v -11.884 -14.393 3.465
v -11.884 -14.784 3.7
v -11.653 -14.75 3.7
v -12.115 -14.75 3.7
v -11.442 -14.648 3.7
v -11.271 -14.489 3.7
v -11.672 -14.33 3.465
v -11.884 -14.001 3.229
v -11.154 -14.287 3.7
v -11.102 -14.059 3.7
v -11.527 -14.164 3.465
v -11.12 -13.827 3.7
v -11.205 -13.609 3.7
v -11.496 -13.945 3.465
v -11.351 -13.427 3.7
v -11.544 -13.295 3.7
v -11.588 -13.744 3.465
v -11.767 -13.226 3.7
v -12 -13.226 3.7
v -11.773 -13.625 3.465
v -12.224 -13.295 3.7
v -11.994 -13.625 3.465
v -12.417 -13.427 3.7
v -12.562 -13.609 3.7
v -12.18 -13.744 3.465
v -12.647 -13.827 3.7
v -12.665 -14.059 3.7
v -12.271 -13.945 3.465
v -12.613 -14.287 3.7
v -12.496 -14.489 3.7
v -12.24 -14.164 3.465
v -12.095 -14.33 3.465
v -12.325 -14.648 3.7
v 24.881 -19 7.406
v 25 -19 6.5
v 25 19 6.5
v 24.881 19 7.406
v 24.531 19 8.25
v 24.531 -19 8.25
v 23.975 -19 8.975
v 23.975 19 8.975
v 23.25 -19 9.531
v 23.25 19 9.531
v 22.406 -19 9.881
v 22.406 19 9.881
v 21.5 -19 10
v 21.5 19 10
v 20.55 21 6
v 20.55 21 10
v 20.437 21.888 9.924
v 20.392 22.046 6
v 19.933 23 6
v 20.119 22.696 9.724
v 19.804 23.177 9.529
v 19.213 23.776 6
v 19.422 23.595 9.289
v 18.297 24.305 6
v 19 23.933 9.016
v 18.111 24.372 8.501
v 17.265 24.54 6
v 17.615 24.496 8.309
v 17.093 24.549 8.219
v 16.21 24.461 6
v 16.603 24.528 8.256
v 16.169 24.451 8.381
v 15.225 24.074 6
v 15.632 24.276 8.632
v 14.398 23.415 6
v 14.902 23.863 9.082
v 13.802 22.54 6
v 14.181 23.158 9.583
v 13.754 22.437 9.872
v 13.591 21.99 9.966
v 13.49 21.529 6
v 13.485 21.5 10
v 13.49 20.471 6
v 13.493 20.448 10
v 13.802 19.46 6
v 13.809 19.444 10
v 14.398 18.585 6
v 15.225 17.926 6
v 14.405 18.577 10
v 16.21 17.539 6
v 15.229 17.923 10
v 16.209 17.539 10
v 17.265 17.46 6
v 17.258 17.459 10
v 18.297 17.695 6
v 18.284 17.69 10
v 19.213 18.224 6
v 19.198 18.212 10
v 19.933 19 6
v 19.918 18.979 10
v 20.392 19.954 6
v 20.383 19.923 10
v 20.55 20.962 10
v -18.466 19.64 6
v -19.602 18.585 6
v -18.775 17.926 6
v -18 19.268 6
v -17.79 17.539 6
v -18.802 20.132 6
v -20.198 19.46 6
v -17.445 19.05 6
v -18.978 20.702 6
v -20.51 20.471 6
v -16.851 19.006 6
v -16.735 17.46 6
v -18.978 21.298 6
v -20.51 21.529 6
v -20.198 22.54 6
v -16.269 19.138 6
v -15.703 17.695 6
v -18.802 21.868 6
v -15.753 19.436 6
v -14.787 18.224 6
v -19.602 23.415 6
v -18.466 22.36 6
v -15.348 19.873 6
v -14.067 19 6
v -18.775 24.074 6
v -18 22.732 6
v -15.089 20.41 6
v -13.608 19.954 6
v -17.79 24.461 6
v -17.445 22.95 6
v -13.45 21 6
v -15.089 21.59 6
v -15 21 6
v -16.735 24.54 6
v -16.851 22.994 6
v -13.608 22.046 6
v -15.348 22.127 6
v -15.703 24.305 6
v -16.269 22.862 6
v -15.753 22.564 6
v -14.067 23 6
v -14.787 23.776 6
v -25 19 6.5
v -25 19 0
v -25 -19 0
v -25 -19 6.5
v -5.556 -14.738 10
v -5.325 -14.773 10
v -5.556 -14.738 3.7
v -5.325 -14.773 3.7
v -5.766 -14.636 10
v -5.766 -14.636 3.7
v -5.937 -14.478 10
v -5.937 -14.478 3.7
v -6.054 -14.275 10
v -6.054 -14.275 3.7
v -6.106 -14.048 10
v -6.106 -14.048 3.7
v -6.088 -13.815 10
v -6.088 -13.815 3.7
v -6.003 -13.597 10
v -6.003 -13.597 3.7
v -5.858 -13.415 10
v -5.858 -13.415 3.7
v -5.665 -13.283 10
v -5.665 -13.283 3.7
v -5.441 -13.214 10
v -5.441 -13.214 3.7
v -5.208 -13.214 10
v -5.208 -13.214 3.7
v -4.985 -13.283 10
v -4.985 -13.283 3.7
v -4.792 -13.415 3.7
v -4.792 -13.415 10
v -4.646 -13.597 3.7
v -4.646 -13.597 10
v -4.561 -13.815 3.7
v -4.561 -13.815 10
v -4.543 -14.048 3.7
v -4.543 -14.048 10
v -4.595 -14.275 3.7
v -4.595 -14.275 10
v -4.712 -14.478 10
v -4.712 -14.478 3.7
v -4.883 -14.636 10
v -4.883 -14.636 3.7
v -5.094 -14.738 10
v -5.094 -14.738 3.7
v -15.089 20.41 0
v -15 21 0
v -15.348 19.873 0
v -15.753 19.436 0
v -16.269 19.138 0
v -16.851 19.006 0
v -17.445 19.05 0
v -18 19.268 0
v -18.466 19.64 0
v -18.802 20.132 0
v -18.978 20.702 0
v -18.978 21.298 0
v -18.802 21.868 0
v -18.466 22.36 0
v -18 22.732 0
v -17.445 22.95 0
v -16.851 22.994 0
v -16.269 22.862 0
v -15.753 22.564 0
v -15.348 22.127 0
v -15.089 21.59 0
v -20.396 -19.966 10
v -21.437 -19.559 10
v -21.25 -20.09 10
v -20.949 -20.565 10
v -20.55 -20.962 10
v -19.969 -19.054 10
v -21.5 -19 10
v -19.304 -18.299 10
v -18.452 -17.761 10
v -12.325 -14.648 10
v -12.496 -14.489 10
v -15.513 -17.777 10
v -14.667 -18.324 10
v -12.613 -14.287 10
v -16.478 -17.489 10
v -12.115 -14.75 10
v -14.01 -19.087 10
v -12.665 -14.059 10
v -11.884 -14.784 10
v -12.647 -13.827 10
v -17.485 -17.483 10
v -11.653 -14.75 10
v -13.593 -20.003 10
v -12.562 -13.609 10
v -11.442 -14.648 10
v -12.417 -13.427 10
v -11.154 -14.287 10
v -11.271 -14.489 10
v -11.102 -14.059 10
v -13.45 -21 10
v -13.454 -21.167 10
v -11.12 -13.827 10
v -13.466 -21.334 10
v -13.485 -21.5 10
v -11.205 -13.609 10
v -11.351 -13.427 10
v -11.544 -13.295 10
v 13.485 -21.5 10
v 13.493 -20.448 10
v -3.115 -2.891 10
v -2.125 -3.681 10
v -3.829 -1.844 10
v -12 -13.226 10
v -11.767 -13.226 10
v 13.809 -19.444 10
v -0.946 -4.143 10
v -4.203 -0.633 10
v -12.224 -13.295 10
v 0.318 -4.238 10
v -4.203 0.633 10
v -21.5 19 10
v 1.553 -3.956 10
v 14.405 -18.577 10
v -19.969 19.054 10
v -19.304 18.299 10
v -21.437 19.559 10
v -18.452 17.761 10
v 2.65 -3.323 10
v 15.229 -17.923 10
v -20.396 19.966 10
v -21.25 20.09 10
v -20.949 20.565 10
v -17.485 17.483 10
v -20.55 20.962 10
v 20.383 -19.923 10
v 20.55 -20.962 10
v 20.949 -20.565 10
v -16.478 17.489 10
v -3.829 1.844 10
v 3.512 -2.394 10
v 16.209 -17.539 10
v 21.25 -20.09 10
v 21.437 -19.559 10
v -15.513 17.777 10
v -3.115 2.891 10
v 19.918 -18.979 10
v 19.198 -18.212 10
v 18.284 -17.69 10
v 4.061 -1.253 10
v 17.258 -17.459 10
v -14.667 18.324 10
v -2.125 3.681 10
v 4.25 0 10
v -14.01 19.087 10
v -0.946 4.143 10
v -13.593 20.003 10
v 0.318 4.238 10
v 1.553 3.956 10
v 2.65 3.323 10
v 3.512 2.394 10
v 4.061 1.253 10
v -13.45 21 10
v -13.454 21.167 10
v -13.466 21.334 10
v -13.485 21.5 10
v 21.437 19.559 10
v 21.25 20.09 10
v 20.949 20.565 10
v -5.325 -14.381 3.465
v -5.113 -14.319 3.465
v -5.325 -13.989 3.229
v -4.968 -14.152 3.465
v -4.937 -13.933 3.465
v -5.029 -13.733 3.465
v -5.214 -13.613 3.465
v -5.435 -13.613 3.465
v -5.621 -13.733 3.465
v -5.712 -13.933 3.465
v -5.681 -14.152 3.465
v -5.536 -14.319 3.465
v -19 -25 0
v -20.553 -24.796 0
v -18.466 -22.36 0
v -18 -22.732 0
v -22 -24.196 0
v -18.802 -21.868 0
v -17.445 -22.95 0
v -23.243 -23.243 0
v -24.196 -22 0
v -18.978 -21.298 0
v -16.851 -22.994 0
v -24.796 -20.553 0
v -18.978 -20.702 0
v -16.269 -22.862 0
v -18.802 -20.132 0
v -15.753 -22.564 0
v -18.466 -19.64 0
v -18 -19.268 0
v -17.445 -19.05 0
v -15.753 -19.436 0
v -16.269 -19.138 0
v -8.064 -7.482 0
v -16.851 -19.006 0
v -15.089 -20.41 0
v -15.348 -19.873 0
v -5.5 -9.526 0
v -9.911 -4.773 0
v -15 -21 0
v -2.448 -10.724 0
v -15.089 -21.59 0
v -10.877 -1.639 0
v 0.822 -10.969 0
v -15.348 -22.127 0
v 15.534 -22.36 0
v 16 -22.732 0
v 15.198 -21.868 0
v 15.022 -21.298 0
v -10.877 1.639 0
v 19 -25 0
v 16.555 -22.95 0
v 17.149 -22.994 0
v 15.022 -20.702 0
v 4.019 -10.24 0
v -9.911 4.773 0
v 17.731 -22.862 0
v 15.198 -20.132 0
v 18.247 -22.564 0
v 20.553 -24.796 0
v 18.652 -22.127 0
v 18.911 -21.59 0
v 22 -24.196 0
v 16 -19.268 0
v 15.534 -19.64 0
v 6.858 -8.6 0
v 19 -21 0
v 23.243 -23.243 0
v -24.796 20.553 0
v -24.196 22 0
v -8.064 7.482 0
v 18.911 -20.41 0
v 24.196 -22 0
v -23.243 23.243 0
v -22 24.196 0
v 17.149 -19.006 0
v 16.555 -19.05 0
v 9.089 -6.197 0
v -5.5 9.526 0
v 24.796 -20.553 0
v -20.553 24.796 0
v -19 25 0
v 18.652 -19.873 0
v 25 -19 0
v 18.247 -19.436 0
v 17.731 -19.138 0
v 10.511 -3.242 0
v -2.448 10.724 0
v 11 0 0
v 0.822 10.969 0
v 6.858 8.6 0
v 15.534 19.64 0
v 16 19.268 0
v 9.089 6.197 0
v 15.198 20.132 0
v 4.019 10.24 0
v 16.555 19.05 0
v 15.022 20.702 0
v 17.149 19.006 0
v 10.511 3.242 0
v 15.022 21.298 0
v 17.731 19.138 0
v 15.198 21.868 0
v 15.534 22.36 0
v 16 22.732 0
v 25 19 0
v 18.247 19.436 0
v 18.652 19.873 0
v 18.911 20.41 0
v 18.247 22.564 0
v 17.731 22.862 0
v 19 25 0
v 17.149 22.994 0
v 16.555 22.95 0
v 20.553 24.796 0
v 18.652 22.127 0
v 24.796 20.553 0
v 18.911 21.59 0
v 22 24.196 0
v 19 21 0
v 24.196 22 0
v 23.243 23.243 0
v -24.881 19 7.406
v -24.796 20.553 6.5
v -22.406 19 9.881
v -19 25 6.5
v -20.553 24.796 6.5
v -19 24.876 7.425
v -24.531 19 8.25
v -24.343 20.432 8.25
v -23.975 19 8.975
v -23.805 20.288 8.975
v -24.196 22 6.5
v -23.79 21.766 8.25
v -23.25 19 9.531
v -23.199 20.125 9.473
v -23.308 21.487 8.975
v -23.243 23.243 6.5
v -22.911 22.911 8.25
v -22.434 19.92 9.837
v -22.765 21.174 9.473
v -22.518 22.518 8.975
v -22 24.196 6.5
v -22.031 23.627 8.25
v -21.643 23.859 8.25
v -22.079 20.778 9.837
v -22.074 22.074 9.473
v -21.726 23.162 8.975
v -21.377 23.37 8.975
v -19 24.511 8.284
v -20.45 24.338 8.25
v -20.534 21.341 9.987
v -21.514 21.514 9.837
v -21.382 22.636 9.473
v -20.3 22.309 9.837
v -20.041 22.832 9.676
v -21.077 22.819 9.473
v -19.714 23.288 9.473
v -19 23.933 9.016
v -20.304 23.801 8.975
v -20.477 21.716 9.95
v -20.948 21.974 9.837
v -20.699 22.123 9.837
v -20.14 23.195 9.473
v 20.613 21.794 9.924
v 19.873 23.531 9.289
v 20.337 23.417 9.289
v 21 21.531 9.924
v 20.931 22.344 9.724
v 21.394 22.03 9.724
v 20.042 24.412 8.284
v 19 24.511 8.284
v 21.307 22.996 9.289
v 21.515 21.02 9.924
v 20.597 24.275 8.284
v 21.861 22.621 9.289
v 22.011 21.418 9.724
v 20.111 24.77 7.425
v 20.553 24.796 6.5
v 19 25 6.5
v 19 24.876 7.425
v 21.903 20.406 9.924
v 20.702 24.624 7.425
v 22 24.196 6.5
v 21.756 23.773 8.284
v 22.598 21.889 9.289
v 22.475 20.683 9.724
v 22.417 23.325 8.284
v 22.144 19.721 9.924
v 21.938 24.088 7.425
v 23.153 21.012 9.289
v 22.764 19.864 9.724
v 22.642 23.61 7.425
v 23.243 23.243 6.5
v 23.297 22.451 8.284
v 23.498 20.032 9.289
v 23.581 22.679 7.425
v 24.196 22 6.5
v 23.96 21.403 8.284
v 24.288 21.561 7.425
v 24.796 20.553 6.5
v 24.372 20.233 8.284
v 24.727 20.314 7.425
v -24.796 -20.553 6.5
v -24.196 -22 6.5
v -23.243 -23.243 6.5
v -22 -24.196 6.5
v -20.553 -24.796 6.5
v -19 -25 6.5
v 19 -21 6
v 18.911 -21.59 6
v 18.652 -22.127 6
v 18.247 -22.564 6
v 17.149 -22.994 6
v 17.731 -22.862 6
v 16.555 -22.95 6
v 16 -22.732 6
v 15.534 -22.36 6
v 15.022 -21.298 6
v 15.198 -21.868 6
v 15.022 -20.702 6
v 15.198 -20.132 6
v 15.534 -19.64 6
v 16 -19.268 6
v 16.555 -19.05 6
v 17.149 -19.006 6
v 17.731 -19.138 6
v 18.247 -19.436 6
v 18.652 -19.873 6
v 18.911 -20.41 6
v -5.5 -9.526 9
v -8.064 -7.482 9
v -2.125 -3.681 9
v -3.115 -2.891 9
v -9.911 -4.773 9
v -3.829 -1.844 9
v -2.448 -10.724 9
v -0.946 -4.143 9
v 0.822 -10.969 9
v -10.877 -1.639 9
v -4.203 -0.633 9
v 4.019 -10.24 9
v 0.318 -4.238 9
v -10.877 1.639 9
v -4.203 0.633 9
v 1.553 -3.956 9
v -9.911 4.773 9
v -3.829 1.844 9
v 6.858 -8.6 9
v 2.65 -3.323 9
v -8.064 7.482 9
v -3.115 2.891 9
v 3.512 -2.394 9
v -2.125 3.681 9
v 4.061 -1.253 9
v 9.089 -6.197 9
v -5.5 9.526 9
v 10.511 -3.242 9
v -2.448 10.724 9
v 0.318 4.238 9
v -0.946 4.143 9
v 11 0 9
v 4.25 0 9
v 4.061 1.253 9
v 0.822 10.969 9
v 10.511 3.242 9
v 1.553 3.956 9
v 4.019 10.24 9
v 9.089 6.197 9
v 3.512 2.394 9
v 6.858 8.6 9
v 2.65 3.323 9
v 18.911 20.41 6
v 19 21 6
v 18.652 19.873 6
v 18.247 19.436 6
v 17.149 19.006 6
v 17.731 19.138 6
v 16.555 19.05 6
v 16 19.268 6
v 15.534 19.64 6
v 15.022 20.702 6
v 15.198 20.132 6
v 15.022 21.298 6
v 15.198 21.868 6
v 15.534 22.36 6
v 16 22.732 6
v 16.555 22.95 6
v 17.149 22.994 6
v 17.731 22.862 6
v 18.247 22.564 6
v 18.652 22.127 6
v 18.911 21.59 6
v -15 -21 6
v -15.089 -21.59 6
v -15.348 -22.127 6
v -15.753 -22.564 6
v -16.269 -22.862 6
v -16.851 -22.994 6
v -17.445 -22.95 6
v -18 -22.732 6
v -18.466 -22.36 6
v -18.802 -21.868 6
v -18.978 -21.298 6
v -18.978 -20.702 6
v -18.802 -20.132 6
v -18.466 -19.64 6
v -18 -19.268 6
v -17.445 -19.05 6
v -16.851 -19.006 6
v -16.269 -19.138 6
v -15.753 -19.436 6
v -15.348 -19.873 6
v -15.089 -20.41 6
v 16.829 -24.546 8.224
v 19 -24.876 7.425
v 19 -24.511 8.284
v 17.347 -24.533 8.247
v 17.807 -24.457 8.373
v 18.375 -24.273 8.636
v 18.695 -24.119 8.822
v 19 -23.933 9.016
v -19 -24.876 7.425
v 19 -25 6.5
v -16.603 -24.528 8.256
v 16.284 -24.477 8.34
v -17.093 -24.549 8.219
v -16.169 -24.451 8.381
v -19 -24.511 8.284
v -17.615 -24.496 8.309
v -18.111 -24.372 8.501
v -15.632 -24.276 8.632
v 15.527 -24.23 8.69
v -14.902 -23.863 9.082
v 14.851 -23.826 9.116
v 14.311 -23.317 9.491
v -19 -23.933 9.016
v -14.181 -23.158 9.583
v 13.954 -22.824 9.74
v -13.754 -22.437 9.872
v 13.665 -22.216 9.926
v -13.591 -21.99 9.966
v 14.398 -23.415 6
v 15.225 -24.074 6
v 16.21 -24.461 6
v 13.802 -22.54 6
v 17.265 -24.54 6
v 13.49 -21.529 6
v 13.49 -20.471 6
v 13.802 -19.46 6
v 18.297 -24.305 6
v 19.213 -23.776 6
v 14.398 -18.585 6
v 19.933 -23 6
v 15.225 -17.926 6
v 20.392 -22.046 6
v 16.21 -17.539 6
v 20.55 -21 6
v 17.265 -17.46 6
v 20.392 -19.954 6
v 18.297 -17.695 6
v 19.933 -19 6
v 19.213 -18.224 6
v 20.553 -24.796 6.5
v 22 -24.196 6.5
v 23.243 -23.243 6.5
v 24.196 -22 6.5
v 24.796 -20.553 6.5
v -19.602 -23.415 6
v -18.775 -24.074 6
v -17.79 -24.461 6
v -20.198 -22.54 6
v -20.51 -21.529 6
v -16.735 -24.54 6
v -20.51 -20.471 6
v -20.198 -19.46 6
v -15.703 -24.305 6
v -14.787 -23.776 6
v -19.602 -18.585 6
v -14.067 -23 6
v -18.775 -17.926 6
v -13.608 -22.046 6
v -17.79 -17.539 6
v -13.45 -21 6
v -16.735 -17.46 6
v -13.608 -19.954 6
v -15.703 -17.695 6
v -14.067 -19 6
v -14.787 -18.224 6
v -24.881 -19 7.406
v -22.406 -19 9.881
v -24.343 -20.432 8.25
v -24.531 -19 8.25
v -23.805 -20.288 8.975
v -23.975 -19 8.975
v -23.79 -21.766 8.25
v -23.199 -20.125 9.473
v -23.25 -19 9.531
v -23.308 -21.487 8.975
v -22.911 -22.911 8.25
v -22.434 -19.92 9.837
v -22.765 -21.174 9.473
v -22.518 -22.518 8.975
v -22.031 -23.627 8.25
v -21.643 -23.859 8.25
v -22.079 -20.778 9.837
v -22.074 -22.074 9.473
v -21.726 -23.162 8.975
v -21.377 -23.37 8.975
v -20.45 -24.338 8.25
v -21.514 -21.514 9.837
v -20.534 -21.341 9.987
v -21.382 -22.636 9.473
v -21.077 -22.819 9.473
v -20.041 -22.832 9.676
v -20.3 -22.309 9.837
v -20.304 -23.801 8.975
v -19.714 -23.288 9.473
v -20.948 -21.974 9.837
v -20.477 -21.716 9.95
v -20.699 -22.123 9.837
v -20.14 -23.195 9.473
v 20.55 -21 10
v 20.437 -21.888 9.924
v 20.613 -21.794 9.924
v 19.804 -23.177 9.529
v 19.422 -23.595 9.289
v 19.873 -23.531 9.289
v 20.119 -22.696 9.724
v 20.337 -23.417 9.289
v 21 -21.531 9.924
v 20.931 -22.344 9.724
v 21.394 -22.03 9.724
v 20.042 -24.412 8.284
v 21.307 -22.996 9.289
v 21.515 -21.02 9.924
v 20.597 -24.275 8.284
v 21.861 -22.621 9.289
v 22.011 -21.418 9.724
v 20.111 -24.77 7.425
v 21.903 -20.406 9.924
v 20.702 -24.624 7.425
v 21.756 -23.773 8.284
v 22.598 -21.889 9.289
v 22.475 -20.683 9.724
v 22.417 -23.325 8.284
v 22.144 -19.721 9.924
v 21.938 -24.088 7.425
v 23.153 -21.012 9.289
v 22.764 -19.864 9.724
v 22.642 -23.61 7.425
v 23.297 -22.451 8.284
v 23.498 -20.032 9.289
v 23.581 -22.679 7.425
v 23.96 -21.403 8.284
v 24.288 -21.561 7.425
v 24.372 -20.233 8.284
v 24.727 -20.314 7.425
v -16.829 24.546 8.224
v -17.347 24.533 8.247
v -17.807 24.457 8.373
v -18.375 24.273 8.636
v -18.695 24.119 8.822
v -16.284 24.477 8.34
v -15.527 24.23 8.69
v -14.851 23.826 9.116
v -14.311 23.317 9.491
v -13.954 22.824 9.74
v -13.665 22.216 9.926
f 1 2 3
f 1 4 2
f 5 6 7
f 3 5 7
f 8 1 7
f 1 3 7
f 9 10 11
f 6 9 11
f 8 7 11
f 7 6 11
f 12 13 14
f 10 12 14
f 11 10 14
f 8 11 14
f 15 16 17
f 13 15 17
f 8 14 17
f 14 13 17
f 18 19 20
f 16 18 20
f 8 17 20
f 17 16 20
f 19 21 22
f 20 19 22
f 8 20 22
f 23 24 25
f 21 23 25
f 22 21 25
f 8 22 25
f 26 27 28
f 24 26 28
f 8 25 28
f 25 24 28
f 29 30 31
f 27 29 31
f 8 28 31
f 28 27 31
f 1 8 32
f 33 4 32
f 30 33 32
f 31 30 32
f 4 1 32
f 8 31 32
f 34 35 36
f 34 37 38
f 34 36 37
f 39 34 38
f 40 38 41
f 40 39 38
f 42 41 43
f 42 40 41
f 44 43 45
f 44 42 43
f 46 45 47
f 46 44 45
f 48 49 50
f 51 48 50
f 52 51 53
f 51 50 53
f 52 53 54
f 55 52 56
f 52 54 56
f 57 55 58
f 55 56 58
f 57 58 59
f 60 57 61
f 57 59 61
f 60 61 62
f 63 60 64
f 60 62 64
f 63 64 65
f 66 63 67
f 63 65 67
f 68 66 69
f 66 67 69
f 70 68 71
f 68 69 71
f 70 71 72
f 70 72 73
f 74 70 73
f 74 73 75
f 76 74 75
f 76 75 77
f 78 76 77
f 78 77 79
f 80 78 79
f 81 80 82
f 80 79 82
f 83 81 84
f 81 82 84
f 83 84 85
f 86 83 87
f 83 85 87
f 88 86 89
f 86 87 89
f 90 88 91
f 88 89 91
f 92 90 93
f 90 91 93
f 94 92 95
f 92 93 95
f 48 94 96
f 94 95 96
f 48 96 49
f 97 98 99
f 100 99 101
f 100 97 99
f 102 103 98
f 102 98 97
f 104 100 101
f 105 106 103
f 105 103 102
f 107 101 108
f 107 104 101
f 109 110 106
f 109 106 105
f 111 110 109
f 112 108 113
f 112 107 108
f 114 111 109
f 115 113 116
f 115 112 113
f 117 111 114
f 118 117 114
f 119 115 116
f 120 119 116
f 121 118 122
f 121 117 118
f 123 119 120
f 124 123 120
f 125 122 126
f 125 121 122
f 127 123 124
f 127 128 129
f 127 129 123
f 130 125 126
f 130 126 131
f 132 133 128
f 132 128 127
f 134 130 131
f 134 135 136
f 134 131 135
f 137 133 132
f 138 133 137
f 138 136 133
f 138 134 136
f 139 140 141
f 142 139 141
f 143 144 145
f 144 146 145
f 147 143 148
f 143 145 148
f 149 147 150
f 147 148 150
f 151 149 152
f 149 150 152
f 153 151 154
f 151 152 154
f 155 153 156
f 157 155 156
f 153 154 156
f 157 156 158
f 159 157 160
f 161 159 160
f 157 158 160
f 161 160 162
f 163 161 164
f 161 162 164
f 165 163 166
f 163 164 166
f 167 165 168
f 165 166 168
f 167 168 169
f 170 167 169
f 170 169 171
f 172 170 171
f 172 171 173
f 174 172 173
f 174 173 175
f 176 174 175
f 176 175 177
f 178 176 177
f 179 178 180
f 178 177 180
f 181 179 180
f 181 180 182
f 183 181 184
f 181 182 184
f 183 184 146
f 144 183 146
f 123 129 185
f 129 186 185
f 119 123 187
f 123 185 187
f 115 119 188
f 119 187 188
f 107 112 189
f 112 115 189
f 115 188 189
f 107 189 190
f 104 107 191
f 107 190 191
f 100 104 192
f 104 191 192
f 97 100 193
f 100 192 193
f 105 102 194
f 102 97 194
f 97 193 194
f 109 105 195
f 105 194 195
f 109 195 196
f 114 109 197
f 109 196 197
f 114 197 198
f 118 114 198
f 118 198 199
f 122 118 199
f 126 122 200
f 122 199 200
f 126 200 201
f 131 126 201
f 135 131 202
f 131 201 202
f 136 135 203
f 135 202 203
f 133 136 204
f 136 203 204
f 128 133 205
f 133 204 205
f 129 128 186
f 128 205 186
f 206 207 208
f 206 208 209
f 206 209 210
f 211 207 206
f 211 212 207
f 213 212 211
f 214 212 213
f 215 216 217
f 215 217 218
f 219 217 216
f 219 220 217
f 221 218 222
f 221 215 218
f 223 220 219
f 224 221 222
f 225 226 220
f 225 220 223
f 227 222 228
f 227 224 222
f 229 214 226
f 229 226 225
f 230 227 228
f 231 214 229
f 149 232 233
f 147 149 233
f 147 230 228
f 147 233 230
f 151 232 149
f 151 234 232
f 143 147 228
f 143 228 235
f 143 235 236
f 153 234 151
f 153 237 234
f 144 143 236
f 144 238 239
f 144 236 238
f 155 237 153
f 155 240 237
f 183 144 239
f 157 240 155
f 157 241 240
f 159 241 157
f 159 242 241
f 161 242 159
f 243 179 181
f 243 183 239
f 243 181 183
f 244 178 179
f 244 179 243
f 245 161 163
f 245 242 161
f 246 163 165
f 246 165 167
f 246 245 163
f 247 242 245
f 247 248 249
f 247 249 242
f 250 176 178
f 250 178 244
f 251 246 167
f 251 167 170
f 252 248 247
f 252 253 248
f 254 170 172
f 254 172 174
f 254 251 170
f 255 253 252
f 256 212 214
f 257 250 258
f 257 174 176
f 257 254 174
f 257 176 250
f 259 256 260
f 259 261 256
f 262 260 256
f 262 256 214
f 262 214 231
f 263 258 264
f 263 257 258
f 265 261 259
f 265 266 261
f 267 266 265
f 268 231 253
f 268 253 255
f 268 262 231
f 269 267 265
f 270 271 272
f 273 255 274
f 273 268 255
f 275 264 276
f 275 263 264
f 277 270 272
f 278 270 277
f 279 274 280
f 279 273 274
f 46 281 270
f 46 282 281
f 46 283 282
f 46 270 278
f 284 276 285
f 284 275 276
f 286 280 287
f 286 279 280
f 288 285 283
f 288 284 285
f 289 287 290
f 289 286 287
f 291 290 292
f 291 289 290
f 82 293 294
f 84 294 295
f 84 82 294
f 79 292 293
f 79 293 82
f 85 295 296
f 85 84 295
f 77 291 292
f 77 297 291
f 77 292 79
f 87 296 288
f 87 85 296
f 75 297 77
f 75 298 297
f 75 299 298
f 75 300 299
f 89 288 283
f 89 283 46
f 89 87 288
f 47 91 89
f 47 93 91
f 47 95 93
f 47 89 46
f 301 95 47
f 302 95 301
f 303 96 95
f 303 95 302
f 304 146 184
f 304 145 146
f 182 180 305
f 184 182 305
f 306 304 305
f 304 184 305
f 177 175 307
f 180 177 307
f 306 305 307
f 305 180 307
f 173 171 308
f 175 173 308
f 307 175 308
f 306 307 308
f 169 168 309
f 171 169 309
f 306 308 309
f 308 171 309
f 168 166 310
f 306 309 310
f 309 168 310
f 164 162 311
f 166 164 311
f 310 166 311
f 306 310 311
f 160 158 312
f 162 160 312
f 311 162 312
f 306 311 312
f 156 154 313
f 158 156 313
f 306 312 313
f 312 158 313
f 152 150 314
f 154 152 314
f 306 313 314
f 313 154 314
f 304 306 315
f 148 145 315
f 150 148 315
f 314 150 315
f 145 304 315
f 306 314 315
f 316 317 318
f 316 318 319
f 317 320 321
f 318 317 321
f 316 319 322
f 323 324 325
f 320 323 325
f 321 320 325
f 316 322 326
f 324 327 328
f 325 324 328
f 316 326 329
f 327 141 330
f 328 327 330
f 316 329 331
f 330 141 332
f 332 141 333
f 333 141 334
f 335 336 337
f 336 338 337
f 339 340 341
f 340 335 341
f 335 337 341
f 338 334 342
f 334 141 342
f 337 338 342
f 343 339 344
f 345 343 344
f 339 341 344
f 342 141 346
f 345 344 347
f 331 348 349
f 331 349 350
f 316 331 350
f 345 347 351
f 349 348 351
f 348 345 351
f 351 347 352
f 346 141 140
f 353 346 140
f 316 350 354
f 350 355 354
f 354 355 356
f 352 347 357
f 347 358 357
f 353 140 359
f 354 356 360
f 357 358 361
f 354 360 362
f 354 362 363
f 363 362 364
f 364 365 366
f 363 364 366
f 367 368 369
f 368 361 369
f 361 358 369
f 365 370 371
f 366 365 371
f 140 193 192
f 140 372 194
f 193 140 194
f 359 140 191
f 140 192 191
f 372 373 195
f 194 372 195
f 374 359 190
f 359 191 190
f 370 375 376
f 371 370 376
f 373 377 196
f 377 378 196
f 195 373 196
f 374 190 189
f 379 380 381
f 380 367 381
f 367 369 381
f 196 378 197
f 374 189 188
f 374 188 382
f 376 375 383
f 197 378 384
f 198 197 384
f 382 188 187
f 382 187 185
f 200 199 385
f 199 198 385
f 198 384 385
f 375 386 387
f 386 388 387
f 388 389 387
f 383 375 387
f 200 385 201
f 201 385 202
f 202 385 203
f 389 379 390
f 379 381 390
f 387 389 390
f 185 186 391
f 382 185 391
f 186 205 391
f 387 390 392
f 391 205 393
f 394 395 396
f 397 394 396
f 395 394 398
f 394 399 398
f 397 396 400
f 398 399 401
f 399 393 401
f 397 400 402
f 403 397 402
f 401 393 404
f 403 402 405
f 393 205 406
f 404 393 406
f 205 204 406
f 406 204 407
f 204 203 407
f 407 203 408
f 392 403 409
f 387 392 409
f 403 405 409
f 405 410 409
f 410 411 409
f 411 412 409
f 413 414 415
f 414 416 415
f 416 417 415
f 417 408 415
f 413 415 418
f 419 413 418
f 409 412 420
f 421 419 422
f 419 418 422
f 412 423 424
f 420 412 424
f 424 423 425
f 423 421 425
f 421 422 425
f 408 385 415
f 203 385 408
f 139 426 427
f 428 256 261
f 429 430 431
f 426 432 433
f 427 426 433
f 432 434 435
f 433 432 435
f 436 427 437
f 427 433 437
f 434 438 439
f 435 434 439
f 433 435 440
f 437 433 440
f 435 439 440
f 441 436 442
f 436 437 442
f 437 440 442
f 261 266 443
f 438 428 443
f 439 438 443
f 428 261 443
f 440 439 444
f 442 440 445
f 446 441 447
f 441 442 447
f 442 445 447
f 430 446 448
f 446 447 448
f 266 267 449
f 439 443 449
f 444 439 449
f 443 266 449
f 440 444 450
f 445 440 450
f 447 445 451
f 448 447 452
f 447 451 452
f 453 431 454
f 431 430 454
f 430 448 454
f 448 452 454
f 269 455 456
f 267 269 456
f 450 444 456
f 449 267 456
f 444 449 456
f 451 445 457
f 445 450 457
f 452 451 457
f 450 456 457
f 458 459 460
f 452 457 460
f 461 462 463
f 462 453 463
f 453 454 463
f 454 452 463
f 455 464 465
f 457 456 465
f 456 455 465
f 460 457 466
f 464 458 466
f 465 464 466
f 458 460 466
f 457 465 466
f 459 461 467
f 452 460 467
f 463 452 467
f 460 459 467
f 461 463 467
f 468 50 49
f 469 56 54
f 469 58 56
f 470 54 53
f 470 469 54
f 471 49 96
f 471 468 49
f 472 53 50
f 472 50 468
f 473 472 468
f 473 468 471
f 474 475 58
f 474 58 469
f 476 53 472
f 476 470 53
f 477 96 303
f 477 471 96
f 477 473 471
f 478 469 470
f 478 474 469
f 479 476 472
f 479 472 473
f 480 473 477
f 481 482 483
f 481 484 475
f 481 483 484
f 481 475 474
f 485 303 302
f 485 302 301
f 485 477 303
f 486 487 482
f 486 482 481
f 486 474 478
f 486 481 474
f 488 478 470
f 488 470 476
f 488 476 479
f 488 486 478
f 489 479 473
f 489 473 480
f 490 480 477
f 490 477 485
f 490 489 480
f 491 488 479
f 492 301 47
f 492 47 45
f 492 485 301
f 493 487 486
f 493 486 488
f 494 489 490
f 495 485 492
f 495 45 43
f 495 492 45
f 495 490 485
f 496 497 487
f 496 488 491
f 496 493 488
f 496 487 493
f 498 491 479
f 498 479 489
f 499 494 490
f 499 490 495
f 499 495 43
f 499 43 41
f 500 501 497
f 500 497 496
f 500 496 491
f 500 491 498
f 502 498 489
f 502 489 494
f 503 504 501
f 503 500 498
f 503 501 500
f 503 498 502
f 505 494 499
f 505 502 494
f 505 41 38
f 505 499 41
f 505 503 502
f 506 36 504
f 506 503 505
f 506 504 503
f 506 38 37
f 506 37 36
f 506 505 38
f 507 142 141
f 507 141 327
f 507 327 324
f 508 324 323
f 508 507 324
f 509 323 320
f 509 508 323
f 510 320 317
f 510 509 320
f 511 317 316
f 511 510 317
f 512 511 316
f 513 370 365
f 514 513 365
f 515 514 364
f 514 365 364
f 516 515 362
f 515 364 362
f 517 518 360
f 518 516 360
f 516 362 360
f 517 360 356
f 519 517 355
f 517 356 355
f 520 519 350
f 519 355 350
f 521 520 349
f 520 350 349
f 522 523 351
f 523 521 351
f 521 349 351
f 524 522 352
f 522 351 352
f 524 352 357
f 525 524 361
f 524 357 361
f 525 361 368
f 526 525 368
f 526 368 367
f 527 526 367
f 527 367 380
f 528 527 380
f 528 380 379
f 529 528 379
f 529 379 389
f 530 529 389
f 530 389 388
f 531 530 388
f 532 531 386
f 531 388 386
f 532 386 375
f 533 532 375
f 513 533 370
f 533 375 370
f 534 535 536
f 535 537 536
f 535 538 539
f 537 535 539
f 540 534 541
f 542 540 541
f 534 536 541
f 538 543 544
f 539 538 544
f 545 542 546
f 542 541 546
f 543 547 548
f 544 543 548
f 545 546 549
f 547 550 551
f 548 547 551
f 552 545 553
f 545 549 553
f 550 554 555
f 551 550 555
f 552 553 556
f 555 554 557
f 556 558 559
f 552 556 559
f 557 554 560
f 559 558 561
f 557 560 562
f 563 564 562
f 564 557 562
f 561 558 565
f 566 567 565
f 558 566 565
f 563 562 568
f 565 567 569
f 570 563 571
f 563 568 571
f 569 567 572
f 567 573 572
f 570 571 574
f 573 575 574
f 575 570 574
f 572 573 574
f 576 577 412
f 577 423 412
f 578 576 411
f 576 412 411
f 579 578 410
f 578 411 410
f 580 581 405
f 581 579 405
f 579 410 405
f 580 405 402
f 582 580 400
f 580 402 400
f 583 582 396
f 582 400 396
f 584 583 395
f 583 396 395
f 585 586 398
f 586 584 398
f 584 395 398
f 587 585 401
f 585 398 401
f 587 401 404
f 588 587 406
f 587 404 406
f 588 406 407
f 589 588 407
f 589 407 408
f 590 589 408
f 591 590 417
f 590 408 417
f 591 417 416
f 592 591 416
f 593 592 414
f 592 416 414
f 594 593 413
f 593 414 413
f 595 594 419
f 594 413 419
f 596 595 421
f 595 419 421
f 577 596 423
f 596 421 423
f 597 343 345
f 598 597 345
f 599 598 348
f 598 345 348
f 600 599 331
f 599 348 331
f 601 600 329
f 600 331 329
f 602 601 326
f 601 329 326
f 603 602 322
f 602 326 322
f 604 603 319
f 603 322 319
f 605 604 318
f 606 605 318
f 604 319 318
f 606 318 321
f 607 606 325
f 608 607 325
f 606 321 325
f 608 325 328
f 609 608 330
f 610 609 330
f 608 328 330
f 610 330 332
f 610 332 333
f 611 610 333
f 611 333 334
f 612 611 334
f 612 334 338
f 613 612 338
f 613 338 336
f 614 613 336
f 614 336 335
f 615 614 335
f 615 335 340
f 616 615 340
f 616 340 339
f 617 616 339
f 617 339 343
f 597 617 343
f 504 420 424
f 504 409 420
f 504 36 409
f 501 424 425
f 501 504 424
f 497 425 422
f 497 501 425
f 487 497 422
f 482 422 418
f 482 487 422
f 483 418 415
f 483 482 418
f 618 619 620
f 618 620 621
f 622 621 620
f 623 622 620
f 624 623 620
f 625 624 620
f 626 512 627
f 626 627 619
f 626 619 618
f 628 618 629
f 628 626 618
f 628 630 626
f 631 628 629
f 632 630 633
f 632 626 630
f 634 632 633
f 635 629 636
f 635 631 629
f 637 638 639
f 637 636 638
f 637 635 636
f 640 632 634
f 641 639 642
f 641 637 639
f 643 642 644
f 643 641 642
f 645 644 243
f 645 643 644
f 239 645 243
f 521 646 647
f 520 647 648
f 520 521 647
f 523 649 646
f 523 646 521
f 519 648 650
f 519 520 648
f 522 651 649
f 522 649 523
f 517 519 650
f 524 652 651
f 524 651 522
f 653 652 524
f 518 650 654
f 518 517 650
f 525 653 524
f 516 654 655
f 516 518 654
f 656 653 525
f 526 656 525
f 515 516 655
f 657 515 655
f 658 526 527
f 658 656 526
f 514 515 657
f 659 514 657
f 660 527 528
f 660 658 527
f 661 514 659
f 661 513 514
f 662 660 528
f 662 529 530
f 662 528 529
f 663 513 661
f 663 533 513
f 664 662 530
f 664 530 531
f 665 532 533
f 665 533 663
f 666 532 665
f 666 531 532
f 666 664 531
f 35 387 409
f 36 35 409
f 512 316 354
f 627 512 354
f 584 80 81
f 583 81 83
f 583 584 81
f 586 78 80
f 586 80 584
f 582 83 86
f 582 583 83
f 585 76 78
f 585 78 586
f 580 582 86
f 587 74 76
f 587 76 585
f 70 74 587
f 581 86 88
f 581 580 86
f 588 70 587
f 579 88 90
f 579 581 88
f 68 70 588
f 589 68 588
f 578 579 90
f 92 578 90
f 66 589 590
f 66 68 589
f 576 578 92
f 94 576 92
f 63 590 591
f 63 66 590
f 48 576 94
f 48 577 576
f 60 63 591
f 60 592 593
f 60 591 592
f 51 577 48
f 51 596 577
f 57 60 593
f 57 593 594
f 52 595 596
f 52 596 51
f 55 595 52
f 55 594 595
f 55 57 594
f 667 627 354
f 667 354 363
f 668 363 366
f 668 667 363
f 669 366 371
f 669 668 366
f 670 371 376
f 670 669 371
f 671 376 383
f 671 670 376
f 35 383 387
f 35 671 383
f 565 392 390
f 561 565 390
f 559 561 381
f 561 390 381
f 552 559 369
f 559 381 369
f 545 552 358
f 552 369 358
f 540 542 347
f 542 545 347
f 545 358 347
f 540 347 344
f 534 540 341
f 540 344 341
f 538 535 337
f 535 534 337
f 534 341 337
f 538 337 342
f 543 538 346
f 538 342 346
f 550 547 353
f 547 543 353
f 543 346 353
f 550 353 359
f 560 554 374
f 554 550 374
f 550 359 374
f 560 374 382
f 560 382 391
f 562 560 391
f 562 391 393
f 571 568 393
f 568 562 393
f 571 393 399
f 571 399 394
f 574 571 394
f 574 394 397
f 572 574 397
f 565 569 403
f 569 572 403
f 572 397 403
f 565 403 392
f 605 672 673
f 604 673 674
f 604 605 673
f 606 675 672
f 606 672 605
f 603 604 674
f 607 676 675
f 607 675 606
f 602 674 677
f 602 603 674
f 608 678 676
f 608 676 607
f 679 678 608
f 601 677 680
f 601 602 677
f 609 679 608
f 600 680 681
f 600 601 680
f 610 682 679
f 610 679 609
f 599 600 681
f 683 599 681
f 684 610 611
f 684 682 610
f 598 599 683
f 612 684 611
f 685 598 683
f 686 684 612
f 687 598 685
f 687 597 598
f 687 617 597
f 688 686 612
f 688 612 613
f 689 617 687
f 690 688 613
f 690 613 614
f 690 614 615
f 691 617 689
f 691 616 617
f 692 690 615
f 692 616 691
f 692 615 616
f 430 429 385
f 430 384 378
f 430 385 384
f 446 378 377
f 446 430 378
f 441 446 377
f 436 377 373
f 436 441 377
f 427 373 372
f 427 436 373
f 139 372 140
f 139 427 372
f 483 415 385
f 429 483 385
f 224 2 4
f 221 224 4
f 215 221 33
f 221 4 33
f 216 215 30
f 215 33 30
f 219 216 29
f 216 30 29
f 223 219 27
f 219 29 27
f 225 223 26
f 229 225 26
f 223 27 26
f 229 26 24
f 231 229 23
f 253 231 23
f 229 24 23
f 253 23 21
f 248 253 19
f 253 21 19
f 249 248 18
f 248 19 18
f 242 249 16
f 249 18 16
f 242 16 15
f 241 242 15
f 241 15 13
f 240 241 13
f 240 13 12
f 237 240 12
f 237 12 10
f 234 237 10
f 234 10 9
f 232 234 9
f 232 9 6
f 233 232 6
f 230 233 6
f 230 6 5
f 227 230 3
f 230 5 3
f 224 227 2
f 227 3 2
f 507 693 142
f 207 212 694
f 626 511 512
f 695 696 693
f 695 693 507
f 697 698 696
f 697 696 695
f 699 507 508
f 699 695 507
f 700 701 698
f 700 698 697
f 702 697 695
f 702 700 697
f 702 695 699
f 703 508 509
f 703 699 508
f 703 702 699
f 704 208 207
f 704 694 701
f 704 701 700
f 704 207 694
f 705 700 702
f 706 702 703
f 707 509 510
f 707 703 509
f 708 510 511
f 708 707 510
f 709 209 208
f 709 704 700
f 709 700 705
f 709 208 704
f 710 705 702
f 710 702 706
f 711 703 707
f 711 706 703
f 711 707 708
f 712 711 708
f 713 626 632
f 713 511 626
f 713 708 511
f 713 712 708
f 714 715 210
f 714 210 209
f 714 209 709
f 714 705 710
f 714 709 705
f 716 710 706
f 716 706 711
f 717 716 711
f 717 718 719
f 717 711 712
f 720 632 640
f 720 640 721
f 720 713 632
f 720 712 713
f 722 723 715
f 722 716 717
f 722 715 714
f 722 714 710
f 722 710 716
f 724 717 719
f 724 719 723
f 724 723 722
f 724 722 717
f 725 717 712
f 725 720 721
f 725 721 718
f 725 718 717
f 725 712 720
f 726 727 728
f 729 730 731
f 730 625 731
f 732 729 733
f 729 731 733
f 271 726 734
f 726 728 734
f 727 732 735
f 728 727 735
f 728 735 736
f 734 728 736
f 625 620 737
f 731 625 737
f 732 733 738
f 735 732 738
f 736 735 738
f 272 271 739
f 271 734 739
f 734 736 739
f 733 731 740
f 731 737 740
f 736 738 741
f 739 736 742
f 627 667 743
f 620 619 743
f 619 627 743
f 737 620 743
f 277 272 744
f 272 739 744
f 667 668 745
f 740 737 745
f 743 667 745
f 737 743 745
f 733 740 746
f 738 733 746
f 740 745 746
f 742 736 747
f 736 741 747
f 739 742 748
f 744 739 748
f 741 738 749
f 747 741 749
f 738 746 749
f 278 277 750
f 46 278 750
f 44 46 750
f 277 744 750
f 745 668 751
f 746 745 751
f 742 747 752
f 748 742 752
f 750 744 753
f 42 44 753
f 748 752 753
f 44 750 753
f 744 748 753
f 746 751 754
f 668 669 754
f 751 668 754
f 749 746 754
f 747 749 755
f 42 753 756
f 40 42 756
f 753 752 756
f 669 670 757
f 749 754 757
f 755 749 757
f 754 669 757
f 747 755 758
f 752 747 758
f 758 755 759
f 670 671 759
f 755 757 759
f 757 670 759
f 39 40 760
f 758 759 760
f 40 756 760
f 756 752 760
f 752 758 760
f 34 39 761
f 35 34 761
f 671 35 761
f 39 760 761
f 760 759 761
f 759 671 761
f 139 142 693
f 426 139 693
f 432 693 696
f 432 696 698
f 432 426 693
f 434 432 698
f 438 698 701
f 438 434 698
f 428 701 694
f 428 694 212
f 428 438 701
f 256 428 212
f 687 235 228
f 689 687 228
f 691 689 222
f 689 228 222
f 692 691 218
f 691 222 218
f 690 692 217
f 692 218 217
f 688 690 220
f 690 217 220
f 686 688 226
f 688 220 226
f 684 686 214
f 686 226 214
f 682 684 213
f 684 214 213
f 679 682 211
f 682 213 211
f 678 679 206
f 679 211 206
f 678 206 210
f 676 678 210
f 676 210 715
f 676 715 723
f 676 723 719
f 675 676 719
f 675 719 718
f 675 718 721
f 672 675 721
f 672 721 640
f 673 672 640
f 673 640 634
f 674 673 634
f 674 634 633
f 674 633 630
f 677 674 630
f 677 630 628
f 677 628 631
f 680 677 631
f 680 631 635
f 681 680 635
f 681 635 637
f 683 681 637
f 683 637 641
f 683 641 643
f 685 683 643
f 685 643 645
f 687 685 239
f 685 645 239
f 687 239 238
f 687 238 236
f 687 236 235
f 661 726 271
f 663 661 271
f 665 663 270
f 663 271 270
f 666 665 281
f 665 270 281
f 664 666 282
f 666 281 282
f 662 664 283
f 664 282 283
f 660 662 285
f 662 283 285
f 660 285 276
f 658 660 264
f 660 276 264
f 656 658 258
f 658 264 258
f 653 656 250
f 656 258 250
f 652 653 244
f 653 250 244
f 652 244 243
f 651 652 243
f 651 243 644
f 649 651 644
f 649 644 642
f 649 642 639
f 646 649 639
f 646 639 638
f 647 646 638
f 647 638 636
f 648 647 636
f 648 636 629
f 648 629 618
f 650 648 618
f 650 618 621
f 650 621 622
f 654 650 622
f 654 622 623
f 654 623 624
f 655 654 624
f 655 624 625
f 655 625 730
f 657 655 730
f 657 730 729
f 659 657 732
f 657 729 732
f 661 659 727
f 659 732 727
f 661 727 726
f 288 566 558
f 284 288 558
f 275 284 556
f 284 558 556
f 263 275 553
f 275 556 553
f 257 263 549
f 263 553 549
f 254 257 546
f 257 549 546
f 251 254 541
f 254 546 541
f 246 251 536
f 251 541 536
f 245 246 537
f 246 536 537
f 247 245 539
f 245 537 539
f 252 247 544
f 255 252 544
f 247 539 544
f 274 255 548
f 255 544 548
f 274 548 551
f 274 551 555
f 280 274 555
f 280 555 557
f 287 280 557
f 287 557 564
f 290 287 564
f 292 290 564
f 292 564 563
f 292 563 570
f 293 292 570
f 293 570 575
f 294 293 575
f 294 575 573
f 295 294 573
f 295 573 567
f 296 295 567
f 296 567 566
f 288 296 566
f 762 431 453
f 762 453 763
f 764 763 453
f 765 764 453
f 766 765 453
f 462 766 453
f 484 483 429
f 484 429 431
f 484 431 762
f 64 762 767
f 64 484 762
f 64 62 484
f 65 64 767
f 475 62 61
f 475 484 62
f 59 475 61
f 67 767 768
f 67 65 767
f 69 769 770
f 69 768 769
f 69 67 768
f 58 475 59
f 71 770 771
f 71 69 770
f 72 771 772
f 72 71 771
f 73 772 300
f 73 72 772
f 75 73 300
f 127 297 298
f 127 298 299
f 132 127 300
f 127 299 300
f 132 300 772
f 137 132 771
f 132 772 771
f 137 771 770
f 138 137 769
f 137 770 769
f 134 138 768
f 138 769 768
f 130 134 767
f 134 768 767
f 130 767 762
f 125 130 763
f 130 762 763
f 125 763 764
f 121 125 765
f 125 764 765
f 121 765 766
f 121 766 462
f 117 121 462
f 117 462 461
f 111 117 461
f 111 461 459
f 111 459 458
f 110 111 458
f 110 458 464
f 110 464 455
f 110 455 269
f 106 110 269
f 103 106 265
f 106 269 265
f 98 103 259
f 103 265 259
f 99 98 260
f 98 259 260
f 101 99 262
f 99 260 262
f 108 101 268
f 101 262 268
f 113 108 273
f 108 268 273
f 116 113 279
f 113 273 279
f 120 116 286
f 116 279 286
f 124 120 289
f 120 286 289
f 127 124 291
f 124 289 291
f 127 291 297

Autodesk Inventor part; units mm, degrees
ref_plane "YZ Plane" through (0, 0, 0) normal (1, 0, 0) x (0, 1, 0)
ref_plane "XZ Plane" through (0, 0, 0) normal (0, 1, 0) x (-1, 0, 0)
ref_plane "XY Plane" through (0, 0, 0) normal (0, 0, 1) x (1, 0, 0)
sketch "Sketch1" plane through (0, 0, 0) normal (0, 0, 1) x (1, 0, 0)
  line L0 (-25, -25) -> (25, -25)
  line L1 (25, -25) -> (25, 25)
  line L2 (25, 25) -> (-25, 25)
  line L3 (-25, 25) -> (-25, -25)
  line L4 (-25, -25) -> (25, 25) construction
  line L5 (25, -25) -> (-25, 25) construction
  line L6 (-15, 15) -> (15, 15)
  line L7 (15, 15) -> (15, -15)
  line L8 (15, -15) -> (-15, -15)
  line L9 (-15, -15) -> (-15, 15)
  circle A0 centre (0, 0) radius 11
  circle A1 centre (0, 0) radius 4.25
  circle A2 centre (-17, 21) radius 2
  circle A3 centre (17, 21) radius 2
  circle A4 centre (-17, -21) radius 2
  circle A5 centre (17, -21) radius 2
  dimension "d0" = 50
  dimension "d1" = 50
  dimension "d2" = 10
  dimension "d3" = 22
  dimension "d4" = 8.5
  dimension "d19" = 4
  dimension "d20" = 4
  dimension "d23" = 34
  dimension "d26" = 42
  dimension "d32" = 8
extrude "Extrusion1" add sketch "Sketch1" along normal blind 10 contours L3 L2 L1 L0 | L6 L7 L8 L9 | A0 | A1 | A2 | A3 | A4 | A5
extrude "Extrusion3" cut sketch "Sketch1" along normal blind 9 contours A0
extrude "Extrusion4" cut sketch "Sketch1" along normal through all contours A2 | A3 | A4 | A5
extrude "Extrusion7" cut sketch "Sketch1" along normal through all contours A1
fillet "Fillet1" radius 6 4 edges at (-25, 25, 5) (-25, -25, 5) (25, 25, 5) (25, -25, 5)
sketch "Sketch4" plane through (0, 0, 10) normal (0, 0, 1) x (1, 0, 0)
  circle A0 centre (0, 0) radius 11 projected
  arc A1 (19, -25) -> (25, -19) centre (19, -19) ccw projected
  line L0 (25, -19) -> (25, 19) projected
  arc A2 (25, 19) -> (19, 25) centre (19, 19) ccw projected
  line L1 (19, 25) -> (-19, 25) projected
  arc A3 (-19, 25) -> (-25, 19) centre (-19, 19) ccw projected
  line L2 (-25, 19) -> (-25, -19) projected
  arc A4 (-25, -19) -> (-19, -25) centre (-19, -19) ccw projected
  line L3 (-19, -25) -> (19, -25) projected
  circle A5 centre (17, -21) radius 2 projected
  circle A6 centre (-17, -21) radius 2 projected
  circle A7 centre (17, 21) radius 2 projected
  circle A8 centre (-17, 21) radius 2 projected
  circle A9 centre (17, -21) radius 3.55
  circle A10 centre (-17, -21) radius 2 projected
  circle A11 centre (-17, -21) radius 3.55
  circle A12 centre (-17, 21) radius 3.55
  circle A13 centre (17, 21) radius 3.55
  dimension "d46" = 7.1
extrude "Extrusion9" cut sketch "Sketch4" against normal blind 4 contours A6 | A9 | A11 | A12 | A13
fillet "Fillet3" radius 3.5 8 edges at (-23.2426, -23.2426, 10) (0, -25, 10) (23.2426, -23.2426, 10) (25, 0, 10) (23.2426, 23.2426, 10) (0, 25, 10) (-23.2426, 23.2426, 10) (-25, 0, 10)
sketch "Sketch6" plane through (0, 0, 10) normal (0, 0, 1) x (1, 0, 0)
  point P0 (0, 0)
  point P1 (-5.3246, -13.9891)
  point P2 (-11.8716, -14.0197)
  point P3 (-11.7716, -13.9768)
  point P4 (-11.8836, -14.0009)
hole "Hole1" at (-5.3246, -13.9891, 10) at (-11.8836, -14.0009, 10) direction (0, 0, -1) diameter 1.567 depth 6.3 tip angle 118 thread size "M2x0.4" class "6H" standard "ISO Metric profile"
equation "\"d23\" = d1 - 2 * d32"
equation "\"d26\" = d0 - 2 * d20"
properties part number "gearbox v2"
